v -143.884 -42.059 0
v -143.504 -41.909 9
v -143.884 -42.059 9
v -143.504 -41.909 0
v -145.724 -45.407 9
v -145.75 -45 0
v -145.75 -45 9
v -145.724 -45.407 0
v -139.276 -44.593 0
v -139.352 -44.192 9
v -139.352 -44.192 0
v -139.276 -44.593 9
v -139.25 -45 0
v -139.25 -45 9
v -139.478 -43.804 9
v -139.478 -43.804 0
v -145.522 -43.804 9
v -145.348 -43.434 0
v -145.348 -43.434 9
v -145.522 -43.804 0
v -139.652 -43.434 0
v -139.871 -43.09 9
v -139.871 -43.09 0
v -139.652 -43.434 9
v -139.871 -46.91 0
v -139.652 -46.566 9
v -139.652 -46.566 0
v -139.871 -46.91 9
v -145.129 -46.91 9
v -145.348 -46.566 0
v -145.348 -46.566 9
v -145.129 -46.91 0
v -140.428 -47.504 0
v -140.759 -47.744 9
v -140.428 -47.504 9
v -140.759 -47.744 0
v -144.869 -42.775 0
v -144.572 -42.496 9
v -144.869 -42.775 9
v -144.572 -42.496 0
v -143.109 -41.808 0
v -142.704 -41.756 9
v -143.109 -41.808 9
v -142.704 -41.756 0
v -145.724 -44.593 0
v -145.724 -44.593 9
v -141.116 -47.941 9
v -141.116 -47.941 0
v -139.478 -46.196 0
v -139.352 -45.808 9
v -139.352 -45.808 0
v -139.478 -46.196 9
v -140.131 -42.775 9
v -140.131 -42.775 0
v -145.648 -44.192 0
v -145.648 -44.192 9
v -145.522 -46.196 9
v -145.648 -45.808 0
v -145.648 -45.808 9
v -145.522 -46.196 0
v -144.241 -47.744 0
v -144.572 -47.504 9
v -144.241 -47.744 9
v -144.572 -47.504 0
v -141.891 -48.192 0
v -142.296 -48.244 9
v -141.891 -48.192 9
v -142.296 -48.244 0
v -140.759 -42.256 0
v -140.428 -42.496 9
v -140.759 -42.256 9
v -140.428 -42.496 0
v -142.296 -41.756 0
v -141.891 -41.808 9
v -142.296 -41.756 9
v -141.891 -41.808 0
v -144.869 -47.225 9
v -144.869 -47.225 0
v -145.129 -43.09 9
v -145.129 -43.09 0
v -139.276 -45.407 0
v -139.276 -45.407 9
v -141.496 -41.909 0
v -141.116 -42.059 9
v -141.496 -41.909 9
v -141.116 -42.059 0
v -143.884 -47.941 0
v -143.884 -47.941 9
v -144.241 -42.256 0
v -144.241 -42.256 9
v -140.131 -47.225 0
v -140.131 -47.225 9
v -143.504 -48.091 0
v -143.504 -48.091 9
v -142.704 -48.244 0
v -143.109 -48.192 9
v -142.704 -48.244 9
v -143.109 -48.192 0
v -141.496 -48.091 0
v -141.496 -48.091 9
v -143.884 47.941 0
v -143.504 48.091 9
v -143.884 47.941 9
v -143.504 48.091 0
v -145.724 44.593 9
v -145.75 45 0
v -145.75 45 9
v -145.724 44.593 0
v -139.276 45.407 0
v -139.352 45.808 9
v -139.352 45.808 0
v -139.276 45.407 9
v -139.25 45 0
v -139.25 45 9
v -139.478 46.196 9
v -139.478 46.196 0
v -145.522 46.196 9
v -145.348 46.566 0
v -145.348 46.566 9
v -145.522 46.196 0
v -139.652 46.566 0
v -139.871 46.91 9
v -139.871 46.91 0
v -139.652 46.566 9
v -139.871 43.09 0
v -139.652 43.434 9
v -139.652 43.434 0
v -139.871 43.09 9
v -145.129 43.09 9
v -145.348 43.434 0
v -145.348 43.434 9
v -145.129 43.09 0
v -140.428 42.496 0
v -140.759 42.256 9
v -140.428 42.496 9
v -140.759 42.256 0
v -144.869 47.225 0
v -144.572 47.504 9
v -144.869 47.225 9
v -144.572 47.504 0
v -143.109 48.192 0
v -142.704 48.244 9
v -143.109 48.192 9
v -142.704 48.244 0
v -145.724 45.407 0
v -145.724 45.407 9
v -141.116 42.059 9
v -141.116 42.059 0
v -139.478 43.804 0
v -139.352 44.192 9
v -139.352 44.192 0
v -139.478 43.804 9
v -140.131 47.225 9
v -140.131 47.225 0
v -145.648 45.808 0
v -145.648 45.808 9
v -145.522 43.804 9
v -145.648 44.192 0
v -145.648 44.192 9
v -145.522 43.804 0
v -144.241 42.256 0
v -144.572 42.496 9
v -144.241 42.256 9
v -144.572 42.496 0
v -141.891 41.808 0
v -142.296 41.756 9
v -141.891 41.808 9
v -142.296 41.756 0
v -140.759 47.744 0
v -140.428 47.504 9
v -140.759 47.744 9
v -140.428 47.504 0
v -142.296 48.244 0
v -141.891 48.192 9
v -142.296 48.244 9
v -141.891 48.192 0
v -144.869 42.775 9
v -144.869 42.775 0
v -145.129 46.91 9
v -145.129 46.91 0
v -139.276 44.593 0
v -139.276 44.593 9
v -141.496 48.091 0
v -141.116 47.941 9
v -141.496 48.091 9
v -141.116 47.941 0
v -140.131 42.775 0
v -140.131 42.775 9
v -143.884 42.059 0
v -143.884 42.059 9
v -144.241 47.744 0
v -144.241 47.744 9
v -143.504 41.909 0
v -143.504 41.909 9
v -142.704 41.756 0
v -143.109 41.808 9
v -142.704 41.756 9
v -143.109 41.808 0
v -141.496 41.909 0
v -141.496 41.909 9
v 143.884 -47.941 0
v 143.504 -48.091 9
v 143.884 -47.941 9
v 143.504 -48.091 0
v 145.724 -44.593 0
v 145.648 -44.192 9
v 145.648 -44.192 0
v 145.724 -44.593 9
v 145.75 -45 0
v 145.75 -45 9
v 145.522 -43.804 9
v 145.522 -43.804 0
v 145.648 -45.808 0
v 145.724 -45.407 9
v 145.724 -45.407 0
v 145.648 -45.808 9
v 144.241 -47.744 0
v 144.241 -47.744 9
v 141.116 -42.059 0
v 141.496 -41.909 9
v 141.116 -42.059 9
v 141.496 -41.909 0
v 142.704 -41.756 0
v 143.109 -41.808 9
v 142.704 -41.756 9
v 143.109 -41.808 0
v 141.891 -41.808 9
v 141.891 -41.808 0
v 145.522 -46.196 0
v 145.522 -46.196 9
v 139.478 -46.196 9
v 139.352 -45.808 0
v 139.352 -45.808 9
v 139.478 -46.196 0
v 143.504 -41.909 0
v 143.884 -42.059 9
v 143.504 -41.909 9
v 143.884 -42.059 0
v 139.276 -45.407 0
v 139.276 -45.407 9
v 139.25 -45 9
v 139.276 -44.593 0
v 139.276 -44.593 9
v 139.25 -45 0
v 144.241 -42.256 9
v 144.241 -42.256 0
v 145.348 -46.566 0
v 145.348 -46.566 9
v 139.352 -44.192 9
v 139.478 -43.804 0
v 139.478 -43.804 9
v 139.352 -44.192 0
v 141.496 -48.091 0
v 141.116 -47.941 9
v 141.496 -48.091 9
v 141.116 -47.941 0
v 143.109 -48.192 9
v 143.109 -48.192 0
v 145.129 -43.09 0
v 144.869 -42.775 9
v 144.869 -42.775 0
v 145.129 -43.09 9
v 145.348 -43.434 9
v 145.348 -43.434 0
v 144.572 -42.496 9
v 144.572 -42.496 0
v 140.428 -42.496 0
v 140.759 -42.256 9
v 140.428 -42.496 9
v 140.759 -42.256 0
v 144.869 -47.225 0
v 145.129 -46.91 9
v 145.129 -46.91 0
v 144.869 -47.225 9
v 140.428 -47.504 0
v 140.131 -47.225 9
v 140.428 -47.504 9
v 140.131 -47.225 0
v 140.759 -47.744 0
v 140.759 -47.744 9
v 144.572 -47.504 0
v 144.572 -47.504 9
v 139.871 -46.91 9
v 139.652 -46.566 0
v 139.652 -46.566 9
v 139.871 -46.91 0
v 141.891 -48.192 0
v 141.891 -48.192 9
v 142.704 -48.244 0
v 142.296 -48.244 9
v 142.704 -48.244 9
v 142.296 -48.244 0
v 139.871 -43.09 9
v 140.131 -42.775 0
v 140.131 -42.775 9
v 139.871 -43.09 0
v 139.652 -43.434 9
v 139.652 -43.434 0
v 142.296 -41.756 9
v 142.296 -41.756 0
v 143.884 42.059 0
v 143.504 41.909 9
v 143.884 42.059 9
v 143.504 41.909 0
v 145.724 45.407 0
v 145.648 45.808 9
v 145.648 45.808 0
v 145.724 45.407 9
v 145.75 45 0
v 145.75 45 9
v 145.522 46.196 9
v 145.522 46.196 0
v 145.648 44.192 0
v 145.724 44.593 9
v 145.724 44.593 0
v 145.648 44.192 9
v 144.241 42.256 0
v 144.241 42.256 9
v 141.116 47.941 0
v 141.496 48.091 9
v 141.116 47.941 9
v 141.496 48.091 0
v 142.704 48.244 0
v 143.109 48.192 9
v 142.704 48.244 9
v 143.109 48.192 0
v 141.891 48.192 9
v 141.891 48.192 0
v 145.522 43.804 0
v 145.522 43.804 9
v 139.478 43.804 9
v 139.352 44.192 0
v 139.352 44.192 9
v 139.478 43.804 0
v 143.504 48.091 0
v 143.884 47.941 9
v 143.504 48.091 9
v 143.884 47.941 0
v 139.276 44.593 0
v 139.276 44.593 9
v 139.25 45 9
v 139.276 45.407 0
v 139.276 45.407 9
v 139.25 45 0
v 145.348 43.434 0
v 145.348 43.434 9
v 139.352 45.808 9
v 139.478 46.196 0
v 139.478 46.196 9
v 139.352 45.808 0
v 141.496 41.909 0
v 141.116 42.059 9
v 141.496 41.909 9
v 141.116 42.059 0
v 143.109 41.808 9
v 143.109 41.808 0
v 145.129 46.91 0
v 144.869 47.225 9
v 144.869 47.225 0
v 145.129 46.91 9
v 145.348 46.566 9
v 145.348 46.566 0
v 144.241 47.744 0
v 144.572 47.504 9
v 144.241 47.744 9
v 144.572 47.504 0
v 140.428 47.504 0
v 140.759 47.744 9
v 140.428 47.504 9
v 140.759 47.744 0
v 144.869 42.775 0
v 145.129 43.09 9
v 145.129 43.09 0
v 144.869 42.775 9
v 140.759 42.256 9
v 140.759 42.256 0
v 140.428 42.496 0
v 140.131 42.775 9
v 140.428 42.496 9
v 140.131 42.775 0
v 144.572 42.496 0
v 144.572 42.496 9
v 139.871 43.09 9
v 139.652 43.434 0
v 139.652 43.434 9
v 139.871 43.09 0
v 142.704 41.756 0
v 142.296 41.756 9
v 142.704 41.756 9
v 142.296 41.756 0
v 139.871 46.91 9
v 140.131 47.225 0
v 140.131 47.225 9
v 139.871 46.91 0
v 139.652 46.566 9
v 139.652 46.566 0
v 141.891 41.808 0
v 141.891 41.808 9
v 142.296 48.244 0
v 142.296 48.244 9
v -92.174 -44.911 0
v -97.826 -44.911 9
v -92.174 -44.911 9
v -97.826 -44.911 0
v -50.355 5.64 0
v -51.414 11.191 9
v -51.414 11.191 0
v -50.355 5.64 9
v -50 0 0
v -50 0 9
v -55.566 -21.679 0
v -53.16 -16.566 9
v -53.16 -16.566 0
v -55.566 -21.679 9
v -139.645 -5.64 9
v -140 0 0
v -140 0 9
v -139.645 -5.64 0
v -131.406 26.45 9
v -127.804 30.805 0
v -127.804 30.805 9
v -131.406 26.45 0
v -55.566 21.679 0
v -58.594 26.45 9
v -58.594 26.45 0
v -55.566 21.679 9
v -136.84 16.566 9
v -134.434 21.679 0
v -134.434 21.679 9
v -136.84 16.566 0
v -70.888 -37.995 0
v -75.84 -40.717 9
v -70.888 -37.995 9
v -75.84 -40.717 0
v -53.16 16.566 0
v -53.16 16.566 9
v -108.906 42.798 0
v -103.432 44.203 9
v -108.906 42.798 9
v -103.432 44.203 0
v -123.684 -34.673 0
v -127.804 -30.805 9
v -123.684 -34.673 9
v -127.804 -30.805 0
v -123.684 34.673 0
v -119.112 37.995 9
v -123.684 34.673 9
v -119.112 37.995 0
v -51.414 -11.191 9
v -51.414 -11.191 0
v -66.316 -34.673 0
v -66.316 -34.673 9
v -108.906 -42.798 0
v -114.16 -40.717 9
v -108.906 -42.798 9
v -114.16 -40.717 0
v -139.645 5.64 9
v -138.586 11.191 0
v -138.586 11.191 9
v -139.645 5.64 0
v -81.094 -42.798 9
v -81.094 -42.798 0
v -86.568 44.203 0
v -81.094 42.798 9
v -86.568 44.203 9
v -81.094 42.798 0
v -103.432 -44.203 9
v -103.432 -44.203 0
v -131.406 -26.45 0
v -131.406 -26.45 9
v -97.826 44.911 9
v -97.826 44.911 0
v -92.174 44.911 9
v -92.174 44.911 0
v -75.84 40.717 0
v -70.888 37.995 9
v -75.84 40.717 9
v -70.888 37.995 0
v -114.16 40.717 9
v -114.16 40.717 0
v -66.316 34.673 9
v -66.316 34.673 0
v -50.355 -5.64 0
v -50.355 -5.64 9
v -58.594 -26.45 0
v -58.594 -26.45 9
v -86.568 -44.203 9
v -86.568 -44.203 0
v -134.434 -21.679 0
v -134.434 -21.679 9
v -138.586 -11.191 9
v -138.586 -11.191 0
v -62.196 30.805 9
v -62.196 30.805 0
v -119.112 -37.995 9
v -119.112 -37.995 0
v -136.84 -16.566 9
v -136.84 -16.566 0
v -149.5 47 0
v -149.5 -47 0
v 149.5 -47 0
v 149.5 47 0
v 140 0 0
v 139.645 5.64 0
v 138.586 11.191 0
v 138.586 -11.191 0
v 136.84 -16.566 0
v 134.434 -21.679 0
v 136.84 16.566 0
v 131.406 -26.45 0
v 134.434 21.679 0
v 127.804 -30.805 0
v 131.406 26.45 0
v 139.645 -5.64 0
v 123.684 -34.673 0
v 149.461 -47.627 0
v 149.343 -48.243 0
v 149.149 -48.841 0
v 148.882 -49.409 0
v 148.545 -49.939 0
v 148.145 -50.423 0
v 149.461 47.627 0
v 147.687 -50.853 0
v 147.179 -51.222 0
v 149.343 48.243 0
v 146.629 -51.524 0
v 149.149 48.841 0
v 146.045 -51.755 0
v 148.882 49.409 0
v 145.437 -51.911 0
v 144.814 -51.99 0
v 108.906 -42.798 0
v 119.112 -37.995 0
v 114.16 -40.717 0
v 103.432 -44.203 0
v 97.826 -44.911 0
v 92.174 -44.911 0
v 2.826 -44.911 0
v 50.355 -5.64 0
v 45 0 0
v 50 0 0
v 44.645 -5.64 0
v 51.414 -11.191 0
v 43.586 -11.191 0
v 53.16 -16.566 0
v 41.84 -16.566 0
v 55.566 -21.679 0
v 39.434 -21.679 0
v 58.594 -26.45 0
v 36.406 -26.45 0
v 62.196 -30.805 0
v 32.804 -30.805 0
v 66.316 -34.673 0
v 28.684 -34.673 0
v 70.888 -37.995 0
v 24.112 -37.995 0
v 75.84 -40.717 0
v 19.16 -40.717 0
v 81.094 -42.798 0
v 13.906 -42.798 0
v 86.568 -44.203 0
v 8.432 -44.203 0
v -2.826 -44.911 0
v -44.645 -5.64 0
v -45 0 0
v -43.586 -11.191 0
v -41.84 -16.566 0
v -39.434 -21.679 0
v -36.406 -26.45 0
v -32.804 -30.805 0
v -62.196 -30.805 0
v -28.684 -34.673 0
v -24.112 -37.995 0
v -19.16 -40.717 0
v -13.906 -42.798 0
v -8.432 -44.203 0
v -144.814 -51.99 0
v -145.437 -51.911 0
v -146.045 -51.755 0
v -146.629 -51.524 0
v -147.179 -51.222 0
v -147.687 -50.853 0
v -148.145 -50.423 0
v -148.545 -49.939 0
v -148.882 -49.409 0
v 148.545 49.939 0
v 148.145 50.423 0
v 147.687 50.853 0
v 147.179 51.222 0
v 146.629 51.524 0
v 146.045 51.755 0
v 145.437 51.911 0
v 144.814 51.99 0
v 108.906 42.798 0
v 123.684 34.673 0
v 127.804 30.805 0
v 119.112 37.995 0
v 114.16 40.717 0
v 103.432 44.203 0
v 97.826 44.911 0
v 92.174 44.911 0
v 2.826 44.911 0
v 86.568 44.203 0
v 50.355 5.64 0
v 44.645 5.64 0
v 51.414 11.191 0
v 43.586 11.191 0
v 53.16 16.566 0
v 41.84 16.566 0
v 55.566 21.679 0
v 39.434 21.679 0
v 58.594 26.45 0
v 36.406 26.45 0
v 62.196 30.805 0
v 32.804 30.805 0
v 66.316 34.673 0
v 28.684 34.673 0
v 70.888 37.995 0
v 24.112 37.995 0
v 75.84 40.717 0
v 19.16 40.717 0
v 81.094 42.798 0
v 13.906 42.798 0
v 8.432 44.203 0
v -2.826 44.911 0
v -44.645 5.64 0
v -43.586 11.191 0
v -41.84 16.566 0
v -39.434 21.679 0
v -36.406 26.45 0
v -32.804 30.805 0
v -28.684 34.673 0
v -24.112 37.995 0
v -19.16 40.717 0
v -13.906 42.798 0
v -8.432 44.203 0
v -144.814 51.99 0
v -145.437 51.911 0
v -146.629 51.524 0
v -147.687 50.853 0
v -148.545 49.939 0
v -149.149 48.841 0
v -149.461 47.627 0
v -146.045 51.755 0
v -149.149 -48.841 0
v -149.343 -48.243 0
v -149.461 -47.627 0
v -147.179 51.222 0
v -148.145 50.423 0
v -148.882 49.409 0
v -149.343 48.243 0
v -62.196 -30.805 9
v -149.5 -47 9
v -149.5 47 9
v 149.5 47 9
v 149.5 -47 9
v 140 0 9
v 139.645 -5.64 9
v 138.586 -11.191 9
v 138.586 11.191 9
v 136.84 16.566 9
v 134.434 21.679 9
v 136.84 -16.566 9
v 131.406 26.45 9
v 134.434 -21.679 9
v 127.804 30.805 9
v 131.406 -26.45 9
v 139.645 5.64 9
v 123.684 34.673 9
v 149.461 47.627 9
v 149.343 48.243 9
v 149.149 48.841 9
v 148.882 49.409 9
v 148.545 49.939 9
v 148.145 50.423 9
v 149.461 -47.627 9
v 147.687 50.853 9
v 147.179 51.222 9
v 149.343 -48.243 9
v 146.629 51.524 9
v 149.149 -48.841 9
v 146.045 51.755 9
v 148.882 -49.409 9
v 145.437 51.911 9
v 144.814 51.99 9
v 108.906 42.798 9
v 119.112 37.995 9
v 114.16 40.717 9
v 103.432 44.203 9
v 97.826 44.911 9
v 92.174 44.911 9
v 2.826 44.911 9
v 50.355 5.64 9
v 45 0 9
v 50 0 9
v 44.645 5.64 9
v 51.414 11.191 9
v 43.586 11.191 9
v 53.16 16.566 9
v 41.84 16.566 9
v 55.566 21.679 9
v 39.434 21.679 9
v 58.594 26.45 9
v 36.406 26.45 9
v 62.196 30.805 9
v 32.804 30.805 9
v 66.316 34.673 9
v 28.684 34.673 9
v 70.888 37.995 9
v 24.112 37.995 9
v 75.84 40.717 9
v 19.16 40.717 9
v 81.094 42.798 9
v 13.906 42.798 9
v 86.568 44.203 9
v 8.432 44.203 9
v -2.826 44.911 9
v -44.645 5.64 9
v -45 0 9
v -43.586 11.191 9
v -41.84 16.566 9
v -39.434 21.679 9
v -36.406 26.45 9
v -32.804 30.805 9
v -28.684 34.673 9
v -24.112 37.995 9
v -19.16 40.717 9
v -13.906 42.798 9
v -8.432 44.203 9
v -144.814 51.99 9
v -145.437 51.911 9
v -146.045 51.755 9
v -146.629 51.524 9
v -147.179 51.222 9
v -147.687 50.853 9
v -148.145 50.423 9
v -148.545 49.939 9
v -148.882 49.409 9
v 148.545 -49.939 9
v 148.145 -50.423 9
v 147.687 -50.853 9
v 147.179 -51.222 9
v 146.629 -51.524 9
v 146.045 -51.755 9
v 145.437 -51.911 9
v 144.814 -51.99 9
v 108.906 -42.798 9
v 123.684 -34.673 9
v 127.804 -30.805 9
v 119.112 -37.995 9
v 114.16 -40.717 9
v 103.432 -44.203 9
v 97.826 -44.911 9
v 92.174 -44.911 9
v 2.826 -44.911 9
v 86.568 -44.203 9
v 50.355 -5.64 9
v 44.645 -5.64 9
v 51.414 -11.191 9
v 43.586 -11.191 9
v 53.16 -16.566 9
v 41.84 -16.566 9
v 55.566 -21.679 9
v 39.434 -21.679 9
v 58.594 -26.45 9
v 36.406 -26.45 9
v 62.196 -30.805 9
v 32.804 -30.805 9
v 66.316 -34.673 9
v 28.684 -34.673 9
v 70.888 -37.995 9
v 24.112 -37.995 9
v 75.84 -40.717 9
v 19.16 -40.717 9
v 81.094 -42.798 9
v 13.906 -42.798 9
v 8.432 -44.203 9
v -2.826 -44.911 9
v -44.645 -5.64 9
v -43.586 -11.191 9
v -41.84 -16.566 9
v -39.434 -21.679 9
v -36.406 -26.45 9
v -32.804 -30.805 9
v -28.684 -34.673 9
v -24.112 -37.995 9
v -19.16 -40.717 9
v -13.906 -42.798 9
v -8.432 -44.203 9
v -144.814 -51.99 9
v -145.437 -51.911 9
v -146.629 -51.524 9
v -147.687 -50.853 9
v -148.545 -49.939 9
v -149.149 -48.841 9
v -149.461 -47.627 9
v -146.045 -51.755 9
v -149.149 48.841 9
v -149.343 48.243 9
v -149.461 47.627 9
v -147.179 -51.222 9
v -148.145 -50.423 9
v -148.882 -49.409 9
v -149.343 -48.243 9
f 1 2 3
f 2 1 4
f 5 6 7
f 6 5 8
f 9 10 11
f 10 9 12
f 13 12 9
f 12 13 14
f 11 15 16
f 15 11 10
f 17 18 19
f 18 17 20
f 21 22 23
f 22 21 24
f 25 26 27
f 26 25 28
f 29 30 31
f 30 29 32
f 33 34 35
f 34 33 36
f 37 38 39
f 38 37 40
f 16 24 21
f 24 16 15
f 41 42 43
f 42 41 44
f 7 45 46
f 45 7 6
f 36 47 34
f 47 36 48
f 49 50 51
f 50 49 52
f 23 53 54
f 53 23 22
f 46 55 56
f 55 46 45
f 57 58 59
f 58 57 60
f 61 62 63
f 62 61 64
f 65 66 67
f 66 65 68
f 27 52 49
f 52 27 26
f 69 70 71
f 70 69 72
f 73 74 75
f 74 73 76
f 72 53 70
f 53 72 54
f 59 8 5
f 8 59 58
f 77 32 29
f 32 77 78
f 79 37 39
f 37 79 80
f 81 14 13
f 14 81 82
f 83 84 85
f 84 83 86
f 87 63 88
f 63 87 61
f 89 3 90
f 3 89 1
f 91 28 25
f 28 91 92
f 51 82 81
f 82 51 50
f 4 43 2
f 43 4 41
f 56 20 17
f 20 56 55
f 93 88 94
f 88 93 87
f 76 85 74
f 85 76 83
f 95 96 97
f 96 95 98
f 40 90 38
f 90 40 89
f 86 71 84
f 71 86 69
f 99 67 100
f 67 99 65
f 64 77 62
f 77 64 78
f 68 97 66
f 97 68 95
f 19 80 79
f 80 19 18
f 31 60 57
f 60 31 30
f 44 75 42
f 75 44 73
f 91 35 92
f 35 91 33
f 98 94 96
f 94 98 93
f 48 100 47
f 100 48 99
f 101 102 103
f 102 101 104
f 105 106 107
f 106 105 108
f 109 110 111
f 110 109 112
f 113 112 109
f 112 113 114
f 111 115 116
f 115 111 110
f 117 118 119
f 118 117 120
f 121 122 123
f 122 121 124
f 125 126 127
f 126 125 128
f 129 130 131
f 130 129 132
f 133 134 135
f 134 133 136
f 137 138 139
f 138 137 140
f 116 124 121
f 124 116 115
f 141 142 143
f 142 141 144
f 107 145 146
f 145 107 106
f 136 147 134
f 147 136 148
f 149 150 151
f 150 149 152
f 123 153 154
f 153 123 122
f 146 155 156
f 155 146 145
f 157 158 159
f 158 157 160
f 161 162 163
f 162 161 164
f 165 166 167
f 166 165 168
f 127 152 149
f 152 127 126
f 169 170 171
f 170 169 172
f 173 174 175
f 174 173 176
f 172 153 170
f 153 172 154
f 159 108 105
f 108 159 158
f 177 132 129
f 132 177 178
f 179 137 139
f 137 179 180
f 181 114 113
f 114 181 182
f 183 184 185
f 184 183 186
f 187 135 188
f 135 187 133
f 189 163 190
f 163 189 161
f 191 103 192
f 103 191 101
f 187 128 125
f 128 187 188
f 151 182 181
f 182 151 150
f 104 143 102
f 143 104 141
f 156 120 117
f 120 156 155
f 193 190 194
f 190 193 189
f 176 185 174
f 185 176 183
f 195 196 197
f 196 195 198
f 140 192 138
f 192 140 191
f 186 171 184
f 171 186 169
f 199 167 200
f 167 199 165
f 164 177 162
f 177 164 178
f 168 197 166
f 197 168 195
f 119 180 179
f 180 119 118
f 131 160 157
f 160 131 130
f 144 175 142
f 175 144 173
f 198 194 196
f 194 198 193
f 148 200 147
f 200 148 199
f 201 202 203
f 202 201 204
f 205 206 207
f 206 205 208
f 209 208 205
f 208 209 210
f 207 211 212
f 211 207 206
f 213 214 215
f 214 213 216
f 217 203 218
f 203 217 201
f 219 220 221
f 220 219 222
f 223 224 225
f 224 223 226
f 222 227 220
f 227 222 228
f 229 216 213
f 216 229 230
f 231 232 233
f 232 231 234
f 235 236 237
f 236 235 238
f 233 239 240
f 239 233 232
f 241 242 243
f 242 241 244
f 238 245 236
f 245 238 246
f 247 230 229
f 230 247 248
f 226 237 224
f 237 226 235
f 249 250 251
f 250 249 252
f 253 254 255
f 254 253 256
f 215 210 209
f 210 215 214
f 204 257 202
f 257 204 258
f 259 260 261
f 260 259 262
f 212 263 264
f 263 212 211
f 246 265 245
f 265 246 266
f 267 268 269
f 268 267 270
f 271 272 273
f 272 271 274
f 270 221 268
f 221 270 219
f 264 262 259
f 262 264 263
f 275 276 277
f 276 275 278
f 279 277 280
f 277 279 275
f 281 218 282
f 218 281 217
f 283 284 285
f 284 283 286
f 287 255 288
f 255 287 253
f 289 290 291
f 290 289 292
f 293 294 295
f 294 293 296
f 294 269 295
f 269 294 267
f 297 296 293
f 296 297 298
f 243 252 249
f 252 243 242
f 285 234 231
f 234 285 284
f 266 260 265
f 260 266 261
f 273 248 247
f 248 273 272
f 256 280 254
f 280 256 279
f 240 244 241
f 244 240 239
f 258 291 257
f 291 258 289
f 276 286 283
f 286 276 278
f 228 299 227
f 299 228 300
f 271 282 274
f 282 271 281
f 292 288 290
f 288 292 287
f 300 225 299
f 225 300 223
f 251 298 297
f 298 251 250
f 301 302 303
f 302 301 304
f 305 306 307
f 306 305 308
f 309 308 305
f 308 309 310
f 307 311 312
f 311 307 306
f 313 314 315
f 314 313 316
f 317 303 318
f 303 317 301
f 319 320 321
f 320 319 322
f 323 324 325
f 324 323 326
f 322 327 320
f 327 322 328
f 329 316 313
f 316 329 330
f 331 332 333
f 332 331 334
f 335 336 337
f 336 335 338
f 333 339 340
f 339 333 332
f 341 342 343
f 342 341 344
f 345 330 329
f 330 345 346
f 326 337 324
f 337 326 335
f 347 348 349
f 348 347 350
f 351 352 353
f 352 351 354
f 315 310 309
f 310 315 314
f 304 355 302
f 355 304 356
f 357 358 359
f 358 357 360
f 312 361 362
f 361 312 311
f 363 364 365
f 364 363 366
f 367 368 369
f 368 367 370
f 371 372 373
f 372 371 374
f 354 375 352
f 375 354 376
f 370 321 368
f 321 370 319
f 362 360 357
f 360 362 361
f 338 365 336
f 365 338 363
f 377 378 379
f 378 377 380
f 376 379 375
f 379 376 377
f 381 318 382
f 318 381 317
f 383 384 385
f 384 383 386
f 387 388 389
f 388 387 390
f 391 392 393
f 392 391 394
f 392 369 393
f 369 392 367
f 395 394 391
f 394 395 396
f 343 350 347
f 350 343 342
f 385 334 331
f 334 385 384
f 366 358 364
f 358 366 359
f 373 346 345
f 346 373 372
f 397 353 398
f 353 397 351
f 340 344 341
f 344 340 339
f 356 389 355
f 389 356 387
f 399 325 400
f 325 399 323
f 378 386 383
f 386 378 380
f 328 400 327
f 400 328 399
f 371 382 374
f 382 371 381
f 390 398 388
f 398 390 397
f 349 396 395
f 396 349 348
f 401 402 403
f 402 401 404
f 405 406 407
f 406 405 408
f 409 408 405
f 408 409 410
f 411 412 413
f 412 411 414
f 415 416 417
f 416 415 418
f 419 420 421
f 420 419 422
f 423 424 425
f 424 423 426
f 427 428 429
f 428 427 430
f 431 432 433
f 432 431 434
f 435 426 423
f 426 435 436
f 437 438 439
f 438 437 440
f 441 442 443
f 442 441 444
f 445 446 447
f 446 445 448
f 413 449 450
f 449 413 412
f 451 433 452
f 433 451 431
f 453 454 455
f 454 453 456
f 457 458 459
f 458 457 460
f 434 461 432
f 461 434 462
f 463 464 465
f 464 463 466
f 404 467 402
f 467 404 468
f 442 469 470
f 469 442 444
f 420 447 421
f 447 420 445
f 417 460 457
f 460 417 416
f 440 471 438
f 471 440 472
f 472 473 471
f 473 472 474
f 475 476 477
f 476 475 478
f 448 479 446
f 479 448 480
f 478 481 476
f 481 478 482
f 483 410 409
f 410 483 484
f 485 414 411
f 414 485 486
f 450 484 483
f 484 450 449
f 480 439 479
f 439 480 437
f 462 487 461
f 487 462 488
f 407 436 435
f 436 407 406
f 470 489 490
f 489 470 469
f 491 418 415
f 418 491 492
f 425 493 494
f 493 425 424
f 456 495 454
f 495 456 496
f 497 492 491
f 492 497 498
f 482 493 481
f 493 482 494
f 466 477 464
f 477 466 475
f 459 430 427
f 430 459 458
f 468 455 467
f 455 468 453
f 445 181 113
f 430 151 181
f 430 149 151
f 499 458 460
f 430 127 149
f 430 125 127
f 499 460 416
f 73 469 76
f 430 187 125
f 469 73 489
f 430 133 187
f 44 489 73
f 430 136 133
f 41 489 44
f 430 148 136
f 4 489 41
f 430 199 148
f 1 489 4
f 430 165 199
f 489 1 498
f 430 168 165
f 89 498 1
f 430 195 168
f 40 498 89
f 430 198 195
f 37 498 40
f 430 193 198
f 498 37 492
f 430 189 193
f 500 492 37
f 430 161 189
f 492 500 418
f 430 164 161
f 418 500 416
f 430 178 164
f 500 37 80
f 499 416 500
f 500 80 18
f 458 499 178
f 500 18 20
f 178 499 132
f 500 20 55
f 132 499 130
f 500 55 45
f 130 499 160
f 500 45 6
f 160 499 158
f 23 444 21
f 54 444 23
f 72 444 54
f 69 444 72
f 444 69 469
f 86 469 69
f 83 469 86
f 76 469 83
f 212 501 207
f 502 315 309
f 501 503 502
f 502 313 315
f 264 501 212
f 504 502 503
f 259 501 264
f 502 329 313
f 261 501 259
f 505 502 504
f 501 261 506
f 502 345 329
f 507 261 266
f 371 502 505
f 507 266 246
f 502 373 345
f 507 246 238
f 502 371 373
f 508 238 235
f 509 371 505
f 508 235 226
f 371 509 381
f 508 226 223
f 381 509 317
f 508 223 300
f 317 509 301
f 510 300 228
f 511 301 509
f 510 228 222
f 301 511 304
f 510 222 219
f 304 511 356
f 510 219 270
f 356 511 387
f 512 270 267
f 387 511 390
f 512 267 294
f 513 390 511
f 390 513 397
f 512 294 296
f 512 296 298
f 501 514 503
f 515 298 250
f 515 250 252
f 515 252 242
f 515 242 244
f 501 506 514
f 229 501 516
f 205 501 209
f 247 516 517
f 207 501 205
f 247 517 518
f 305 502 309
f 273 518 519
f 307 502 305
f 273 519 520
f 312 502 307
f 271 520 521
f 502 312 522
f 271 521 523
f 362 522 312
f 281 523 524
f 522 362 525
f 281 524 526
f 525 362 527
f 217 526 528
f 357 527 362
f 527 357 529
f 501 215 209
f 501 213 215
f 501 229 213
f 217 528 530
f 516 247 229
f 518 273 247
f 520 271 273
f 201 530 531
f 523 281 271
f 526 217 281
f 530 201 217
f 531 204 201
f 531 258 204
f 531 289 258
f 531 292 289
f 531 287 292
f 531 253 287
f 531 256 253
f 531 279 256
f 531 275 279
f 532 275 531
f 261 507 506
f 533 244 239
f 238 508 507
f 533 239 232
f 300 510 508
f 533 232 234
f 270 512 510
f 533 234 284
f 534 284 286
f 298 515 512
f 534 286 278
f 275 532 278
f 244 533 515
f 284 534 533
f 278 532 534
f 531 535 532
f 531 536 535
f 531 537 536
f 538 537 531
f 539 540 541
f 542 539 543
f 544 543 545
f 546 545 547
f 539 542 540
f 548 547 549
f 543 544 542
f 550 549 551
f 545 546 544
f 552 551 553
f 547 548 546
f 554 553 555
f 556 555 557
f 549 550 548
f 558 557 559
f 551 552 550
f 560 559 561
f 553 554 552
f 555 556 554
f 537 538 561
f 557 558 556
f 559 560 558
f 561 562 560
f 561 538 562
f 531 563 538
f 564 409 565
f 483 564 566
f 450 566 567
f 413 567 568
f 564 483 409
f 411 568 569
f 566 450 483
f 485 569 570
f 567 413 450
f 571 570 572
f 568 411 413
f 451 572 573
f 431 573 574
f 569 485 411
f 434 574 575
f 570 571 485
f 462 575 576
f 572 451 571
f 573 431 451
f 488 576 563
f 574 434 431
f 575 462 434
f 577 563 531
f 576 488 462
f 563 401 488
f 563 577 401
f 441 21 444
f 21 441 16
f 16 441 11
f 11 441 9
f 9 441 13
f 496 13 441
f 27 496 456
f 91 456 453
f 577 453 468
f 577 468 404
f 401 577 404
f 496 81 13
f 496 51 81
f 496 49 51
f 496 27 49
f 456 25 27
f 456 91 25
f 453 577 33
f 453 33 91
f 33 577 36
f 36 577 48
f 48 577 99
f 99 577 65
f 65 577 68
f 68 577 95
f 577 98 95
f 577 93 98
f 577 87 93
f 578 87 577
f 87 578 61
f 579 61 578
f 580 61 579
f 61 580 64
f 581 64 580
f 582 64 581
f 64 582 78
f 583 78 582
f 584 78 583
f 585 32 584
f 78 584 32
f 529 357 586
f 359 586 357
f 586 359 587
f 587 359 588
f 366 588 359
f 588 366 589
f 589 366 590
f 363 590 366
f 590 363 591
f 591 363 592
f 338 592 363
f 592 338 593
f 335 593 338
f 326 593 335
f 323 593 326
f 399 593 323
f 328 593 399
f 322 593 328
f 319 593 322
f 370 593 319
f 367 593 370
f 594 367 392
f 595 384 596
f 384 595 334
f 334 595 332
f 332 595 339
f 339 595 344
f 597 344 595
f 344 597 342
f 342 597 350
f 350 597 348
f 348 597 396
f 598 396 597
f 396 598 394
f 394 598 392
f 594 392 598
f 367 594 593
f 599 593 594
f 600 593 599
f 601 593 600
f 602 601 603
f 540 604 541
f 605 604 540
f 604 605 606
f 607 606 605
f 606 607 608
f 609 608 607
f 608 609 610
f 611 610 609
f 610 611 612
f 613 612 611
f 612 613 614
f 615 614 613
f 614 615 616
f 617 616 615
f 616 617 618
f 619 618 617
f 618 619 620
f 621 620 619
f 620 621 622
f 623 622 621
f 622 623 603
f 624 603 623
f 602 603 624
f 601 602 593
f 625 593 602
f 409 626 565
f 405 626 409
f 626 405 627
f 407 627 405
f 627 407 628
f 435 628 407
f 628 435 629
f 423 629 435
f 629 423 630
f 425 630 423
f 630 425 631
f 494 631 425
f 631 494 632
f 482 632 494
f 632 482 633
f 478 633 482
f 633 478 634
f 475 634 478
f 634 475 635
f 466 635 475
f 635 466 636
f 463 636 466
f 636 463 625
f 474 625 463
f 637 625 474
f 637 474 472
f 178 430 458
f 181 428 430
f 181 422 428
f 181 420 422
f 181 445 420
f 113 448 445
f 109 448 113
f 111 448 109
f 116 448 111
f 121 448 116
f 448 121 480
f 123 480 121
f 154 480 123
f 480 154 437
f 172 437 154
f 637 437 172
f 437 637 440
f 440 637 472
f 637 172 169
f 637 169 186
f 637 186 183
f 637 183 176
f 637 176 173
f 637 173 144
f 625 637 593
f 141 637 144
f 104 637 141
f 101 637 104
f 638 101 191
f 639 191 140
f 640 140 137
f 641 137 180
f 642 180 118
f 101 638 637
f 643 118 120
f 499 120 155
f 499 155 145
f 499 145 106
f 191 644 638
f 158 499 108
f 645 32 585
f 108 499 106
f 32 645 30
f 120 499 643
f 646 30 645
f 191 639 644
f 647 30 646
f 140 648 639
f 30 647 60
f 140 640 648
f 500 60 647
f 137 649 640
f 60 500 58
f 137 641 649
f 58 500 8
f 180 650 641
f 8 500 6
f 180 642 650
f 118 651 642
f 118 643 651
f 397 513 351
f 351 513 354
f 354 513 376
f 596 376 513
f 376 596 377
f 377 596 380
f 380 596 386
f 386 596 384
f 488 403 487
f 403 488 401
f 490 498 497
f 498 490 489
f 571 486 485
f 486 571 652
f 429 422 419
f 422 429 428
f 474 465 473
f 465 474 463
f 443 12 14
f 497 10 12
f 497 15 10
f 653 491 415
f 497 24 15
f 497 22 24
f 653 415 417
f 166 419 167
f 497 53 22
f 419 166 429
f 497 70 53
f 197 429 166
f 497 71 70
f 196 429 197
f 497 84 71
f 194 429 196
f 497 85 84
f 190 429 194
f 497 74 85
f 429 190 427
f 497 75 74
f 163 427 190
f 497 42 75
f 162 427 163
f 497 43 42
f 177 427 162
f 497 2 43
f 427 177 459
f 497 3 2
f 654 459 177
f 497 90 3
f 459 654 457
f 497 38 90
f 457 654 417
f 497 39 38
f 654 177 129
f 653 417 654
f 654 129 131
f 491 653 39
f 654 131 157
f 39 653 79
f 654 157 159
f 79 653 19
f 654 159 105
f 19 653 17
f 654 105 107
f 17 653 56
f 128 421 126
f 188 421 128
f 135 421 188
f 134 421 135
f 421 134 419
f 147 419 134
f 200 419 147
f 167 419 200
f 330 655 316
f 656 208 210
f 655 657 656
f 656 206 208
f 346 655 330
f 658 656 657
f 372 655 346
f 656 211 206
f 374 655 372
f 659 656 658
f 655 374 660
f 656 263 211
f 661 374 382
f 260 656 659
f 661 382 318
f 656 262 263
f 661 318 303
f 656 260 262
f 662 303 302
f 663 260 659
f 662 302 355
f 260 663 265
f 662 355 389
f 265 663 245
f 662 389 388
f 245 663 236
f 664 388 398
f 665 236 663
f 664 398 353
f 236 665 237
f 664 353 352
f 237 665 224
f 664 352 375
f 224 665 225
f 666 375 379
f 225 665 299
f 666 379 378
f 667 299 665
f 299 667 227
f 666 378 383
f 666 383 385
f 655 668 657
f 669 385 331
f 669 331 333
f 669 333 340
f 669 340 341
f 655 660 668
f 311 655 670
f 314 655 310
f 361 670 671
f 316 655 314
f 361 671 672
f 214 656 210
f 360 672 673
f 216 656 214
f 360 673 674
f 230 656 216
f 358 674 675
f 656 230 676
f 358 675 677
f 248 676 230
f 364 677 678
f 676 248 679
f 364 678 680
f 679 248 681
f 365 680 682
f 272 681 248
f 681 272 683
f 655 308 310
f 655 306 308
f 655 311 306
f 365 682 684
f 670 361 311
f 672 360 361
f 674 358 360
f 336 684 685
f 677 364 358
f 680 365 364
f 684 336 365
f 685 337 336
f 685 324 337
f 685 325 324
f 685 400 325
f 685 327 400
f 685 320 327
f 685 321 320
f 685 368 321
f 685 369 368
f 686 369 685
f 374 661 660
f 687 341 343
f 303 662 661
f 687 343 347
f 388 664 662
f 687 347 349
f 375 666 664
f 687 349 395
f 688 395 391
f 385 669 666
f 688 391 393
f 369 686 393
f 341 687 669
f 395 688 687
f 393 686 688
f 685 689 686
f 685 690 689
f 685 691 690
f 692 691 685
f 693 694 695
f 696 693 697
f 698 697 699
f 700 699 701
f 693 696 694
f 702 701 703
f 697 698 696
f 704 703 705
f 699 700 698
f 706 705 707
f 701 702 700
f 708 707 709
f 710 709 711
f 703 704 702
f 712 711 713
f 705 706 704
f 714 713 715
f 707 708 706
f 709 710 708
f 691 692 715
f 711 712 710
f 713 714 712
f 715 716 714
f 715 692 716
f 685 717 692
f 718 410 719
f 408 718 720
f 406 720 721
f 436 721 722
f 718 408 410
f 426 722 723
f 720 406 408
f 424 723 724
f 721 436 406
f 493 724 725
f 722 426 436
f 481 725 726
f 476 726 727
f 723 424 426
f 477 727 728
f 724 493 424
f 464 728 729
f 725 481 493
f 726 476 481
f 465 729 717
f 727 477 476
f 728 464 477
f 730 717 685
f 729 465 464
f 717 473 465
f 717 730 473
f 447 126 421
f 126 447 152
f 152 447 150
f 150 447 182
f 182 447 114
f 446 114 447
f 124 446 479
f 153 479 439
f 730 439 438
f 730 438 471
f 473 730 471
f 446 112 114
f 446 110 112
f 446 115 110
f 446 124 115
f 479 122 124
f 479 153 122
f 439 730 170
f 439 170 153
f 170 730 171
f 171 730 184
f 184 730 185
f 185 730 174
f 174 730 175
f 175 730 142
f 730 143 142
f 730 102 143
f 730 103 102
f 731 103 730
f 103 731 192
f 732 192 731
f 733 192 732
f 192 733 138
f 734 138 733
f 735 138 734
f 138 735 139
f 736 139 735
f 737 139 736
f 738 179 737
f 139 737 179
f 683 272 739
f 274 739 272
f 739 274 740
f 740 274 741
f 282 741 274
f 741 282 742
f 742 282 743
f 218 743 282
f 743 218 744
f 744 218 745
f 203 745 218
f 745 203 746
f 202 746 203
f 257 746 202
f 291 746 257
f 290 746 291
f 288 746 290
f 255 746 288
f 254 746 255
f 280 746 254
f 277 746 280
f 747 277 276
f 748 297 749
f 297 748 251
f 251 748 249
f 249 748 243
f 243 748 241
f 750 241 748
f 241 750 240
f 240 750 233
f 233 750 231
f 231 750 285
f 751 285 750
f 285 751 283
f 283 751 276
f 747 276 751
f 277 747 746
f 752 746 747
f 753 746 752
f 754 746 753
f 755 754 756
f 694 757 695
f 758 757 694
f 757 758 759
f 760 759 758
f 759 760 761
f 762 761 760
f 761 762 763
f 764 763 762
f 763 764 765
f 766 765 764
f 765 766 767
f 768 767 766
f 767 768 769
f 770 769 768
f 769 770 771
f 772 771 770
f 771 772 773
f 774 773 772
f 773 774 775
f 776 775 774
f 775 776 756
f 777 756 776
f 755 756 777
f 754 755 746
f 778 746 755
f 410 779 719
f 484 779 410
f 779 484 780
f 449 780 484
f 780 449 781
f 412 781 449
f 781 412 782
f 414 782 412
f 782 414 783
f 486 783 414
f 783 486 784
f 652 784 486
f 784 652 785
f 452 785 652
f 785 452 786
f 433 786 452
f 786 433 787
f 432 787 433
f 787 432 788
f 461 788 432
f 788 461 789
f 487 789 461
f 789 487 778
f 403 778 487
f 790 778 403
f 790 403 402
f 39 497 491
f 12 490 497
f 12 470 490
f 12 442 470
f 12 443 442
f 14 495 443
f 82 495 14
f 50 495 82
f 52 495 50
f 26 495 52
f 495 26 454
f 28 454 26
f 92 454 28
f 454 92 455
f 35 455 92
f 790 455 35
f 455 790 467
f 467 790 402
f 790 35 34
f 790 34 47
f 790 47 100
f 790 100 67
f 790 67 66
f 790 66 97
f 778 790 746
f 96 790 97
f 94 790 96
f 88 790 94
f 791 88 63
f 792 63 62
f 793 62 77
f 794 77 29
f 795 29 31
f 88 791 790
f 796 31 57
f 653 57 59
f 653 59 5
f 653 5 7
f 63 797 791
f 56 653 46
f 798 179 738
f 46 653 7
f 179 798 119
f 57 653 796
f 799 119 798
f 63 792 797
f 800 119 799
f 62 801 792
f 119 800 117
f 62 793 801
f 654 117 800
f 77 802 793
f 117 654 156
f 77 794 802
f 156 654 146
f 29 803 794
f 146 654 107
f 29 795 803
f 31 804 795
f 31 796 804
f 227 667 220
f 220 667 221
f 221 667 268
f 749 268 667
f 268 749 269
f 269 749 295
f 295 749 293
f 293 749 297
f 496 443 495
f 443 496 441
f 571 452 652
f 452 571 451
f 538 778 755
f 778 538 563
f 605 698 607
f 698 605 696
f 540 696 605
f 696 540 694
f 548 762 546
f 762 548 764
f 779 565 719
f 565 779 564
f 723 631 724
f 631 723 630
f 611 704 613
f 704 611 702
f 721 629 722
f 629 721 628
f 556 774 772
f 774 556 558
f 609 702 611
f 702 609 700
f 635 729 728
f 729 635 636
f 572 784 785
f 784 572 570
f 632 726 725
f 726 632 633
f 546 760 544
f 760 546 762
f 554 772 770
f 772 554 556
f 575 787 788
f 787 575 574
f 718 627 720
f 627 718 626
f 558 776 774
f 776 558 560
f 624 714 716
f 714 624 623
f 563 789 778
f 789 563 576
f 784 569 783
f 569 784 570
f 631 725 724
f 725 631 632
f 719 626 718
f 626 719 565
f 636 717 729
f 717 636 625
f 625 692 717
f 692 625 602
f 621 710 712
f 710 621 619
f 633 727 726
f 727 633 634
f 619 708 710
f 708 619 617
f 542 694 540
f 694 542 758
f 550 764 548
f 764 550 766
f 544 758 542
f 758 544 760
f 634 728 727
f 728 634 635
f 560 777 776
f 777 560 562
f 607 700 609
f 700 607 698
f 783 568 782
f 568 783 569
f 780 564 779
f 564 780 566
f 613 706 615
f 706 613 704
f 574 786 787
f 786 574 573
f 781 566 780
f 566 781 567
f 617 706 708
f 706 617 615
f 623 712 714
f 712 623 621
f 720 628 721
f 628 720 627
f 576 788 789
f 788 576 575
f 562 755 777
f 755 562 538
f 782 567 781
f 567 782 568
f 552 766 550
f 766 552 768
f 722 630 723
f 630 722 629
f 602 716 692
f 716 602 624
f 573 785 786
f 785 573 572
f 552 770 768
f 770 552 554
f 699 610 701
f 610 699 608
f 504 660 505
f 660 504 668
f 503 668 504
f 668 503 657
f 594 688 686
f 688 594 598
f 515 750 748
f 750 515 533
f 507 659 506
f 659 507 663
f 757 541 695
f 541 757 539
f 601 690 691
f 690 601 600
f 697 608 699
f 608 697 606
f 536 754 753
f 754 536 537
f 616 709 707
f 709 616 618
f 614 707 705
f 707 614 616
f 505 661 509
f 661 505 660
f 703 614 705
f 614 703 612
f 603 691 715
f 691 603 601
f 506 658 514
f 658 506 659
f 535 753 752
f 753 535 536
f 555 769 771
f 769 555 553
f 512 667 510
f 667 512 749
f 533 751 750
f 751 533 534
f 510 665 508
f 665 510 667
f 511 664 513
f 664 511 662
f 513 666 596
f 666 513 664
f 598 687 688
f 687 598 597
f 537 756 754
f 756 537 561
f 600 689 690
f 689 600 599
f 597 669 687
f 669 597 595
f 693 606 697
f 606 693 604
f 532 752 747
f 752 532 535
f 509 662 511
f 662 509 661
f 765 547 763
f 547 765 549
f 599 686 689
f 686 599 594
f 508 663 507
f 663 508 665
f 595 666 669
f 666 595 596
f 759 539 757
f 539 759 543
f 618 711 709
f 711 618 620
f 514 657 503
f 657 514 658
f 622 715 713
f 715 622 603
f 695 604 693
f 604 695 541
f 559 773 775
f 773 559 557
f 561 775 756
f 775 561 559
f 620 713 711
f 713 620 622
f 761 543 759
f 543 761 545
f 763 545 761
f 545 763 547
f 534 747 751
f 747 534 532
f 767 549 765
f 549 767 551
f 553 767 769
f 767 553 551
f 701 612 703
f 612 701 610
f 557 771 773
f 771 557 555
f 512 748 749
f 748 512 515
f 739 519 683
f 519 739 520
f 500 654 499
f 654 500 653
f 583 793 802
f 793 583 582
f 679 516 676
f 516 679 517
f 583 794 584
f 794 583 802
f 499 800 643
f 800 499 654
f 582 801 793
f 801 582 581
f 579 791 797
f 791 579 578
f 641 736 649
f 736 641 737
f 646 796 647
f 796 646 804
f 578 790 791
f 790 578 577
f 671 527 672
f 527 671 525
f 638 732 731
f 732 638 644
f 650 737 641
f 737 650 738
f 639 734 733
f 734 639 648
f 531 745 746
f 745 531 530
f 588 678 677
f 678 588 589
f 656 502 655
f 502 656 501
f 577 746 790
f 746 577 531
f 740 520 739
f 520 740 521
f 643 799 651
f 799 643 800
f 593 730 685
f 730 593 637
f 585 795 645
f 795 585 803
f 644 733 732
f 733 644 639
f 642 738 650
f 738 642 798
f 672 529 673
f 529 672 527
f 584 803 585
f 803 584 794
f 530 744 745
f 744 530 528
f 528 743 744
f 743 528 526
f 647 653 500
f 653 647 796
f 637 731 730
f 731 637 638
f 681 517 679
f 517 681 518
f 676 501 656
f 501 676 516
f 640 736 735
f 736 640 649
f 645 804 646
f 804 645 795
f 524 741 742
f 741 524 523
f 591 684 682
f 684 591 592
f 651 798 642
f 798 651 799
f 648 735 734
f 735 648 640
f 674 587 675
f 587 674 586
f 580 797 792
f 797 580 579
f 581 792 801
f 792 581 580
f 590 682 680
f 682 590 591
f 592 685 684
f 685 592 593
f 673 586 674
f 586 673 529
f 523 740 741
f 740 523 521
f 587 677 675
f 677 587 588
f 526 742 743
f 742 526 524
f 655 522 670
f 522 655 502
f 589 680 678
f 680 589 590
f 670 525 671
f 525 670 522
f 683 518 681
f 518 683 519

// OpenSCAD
$fn = 50;


difference() {
	union() {
		hull() {
			translate(v = [-144.5000000000, 47.0000000000, 0]) {
				cylinder(h = 9, r = 5);
			}
			translate(v = [144.5000000000, 47.0000000000, 0]) {
				cylinder(h = 9, r = 5);
			}
			translate(v = [-144.5000000000, -47.0000000000, 0]) {
				cylinder(h = 9, r = 5);
			}
			translate(v = [144.5000000000, -47.0000000000, 0]) {
				cylinder(h = 9, r = 5);
			}
		}
	}
	union() {
		#translate(v = [-142.5000000000, -45.0000000000, -100.0000000000]) {
			cylinder(h = 200, r = 3.2500000000);
		}
		#translate(v = [-142.5000000000, 45.0000000000, -100.0000000000]) {
			cylinder(h = 200, r = 3.2500000000);
		}
		#translate(v = [142.5000000000, -45.0000000000, -100.0000000000]) {
			cylinder(h = 200, r = 3.2500000000);
		}
		#translate(v = [142.5000000000, 45.0000000000, -100.0000000000]) {
			cylinder(h = 200, r = 3.2500000000);
		}
		#translate(v = [-95.0000000000, 0, 0]) {
			cylinder(h = 9, r = 45.0000000000);
		}
		#cylinder(h = 9, r = 45.0000000000);
		#translate(v = [95.0000000000, 0, 0]) {
			cylinder(h = 9, r = 45.0000000000);
		}
	}
}
